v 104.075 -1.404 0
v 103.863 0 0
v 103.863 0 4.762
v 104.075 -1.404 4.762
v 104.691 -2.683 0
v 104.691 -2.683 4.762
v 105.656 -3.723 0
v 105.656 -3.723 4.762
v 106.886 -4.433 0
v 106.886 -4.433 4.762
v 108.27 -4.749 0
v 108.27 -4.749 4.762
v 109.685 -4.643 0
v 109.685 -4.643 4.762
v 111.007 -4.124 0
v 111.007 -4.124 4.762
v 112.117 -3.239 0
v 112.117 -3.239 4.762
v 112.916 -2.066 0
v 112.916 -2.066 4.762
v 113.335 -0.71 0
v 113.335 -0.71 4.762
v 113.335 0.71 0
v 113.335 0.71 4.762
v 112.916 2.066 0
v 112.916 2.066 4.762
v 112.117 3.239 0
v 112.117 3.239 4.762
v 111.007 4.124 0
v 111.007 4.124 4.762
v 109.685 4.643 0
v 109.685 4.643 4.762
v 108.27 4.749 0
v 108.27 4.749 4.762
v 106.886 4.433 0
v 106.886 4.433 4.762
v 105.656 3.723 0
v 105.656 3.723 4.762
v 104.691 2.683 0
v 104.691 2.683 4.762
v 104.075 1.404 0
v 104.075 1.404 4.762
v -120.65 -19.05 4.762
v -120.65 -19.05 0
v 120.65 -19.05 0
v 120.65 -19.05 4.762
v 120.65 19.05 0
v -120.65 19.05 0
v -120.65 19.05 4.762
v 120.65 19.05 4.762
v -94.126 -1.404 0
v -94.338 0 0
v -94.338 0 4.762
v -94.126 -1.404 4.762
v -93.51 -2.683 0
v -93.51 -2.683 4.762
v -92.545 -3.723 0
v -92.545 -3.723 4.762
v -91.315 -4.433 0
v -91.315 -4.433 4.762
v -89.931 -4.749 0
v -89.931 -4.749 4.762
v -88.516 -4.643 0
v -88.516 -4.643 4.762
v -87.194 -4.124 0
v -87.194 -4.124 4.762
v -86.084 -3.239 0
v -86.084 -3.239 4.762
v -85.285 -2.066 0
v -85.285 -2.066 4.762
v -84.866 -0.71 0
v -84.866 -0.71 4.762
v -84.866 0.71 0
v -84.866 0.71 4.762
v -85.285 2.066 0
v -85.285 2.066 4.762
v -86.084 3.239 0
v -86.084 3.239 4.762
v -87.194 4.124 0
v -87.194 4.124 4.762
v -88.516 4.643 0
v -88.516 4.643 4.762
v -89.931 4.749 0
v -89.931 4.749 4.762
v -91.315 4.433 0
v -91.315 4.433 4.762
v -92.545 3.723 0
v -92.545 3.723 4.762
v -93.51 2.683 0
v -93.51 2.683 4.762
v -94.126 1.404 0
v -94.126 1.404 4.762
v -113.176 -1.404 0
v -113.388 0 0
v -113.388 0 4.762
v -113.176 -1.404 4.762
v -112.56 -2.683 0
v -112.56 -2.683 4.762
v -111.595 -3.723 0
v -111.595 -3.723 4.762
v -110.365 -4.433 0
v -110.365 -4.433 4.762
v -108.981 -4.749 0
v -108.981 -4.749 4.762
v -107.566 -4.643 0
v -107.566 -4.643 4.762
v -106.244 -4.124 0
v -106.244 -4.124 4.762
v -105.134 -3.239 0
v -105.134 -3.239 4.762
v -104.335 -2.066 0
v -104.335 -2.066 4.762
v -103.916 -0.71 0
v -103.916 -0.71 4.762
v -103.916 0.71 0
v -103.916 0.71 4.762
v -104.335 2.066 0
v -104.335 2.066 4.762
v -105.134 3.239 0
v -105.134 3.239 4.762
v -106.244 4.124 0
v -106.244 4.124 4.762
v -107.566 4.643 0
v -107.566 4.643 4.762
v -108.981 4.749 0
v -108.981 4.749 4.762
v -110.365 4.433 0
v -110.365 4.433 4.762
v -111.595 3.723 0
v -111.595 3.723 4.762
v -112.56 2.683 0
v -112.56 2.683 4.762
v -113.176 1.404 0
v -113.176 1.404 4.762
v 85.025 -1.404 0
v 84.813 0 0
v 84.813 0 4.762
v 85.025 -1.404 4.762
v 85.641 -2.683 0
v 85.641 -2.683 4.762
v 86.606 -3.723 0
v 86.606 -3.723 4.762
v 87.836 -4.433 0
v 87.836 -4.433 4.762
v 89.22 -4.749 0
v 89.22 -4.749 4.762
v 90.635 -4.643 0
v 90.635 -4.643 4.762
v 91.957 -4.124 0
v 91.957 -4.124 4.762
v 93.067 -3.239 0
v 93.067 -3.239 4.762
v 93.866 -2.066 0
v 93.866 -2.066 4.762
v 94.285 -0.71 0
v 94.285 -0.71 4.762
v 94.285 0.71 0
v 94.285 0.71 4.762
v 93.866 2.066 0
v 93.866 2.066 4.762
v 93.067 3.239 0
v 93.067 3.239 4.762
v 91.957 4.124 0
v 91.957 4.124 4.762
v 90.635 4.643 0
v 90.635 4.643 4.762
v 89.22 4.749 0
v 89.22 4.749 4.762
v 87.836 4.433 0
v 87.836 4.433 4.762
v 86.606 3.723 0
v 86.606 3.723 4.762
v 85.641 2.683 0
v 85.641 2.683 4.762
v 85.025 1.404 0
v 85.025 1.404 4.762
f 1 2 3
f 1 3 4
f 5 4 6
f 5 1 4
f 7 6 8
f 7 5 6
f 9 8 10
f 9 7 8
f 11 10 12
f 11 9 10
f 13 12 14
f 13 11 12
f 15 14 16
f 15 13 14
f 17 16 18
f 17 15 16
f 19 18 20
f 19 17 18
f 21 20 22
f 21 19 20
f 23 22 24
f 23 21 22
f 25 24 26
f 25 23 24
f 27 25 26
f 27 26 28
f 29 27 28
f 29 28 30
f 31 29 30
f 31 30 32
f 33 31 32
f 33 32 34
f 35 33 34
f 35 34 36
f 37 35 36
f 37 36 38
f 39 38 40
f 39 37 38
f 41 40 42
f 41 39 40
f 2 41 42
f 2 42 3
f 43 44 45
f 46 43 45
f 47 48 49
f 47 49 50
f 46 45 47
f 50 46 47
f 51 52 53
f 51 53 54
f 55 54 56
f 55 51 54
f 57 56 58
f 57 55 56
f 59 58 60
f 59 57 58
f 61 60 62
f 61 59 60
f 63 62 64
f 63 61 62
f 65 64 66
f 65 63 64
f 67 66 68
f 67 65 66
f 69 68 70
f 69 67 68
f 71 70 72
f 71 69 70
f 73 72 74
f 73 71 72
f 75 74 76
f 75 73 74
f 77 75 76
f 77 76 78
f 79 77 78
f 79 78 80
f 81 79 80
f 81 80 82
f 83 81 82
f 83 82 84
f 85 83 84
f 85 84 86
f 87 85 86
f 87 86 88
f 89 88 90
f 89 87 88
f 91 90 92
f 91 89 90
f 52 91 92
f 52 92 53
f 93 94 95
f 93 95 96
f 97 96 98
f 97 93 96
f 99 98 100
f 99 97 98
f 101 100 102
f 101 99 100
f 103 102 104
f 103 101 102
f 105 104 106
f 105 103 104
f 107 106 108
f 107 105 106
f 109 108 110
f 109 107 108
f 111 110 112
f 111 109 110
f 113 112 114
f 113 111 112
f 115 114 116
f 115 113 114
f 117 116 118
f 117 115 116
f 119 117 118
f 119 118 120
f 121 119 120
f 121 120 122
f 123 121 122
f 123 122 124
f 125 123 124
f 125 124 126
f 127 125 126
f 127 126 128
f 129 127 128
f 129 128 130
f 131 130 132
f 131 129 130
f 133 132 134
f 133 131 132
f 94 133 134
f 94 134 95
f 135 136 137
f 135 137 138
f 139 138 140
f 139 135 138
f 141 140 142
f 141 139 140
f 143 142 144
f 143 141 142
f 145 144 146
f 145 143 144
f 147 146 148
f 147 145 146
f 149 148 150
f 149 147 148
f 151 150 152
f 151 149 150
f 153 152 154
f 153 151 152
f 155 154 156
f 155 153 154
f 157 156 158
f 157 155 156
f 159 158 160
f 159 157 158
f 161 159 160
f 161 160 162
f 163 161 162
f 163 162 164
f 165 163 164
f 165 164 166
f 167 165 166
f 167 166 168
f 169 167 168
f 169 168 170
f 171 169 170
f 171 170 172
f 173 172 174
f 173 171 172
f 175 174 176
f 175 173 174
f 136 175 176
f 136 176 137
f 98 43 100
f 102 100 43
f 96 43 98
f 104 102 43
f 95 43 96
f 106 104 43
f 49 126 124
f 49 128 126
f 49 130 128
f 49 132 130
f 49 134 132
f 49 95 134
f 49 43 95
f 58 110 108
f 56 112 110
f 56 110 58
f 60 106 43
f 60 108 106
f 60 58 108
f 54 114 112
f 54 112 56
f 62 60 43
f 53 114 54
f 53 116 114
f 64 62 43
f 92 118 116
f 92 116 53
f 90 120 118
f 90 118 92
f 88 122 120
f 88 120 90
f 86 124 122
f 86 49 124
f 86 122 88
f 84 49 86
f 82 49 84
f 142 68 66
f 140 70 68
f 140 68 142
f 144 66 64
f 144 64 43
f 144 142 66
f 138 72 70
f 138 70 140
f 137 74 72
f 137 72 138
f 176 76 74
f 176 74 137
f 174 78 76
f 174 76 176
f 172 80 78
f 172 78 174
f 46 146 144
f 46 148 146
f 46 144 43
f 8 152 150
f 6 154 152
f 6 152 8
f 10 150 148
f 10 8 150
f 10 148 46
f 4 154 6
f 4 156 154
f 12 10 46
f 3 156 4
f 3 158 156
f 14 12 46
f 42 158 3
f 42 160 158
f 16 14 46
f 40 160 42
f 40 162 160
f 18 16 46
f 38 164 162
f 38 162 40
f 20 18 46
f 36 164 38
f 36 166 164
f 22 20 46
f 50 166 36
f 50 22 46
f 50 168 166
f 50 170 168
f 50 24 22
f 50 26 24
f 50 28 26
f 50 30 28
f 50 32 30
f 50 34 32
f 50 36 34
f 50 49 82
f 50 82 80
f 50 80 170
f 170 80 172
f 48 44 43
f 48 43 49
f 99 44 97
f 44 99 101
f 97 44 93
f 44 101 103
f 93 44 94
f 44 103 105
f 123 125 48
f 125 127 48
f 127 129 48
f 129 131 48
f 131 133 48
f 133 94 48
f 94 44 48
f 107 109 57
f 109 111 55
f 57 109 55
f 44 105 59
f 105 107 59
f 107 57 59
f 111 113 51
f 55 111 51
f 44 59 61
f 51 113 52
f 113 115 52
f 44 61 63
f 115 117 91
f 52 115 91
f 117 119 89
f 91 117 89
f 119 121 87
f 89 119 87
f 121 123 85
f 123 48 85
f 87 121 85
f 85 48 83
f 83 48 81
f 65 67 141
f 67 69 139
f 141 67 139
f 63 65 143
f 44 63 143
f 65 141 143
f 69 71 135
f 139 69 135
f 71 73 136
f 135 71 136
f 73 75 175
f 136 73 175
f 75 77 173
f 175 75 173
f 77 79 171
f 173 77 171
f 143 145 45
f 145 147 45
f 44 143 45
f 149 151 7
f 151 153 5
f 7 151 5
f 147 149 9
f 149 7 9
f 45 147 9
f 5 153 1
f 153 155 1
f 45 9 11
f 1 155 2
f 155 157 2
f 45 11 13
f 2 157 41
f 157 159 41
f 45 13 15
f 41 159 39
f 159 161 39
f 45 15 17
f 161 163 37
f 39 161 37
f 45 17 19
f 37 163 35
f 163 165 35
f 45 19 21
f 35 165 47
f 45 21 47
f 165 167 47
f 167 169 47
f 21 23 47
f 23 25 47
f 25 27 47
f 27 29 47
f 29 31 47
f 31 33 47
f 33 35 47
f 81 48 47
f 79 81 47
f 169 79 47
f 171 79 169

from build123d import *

# Parameters (mm, degrees)
SKETCH1_W           = 241.3
SKETCH1_H           = 38.1
SKETCH1_R           = 4.7625
BOSS_EXTRUDE1_DEPTH = 4.7625


with BuildPart() as part:
    # Sketch1 → Boss-Extrude1 (new body)
    with BuildSketch(Plane.XY):
        Rectangle(SKETCH1_W, SKETCH1_H)
        with Locations(Location((-108.625531915, 0, 0), (0, 0, 180))):
            Circle(SKETCH1_R, mode=Mode.SUBTRACT)
        with Locations(Location((-89.575531915, 0, 0), (0, 0, 180))):
            Circle(SKETCH1_R, mode=Mode.SUBTRACT)
        with Locations(Location((89.575531915, 0, 0), (0, 0, 180))):
            Circle(SKETCH1_R, mode=Mode.SUBTRACT)
        with Locations(Location((108.625531915, 0, 0), (0, 0, 180))):
            Circle(SKETCH1_R, mode=Mode.SUBTRACT)
    extrude(amount=BOSS_EXTRUDE1_DEPTH)


solid = part.part
